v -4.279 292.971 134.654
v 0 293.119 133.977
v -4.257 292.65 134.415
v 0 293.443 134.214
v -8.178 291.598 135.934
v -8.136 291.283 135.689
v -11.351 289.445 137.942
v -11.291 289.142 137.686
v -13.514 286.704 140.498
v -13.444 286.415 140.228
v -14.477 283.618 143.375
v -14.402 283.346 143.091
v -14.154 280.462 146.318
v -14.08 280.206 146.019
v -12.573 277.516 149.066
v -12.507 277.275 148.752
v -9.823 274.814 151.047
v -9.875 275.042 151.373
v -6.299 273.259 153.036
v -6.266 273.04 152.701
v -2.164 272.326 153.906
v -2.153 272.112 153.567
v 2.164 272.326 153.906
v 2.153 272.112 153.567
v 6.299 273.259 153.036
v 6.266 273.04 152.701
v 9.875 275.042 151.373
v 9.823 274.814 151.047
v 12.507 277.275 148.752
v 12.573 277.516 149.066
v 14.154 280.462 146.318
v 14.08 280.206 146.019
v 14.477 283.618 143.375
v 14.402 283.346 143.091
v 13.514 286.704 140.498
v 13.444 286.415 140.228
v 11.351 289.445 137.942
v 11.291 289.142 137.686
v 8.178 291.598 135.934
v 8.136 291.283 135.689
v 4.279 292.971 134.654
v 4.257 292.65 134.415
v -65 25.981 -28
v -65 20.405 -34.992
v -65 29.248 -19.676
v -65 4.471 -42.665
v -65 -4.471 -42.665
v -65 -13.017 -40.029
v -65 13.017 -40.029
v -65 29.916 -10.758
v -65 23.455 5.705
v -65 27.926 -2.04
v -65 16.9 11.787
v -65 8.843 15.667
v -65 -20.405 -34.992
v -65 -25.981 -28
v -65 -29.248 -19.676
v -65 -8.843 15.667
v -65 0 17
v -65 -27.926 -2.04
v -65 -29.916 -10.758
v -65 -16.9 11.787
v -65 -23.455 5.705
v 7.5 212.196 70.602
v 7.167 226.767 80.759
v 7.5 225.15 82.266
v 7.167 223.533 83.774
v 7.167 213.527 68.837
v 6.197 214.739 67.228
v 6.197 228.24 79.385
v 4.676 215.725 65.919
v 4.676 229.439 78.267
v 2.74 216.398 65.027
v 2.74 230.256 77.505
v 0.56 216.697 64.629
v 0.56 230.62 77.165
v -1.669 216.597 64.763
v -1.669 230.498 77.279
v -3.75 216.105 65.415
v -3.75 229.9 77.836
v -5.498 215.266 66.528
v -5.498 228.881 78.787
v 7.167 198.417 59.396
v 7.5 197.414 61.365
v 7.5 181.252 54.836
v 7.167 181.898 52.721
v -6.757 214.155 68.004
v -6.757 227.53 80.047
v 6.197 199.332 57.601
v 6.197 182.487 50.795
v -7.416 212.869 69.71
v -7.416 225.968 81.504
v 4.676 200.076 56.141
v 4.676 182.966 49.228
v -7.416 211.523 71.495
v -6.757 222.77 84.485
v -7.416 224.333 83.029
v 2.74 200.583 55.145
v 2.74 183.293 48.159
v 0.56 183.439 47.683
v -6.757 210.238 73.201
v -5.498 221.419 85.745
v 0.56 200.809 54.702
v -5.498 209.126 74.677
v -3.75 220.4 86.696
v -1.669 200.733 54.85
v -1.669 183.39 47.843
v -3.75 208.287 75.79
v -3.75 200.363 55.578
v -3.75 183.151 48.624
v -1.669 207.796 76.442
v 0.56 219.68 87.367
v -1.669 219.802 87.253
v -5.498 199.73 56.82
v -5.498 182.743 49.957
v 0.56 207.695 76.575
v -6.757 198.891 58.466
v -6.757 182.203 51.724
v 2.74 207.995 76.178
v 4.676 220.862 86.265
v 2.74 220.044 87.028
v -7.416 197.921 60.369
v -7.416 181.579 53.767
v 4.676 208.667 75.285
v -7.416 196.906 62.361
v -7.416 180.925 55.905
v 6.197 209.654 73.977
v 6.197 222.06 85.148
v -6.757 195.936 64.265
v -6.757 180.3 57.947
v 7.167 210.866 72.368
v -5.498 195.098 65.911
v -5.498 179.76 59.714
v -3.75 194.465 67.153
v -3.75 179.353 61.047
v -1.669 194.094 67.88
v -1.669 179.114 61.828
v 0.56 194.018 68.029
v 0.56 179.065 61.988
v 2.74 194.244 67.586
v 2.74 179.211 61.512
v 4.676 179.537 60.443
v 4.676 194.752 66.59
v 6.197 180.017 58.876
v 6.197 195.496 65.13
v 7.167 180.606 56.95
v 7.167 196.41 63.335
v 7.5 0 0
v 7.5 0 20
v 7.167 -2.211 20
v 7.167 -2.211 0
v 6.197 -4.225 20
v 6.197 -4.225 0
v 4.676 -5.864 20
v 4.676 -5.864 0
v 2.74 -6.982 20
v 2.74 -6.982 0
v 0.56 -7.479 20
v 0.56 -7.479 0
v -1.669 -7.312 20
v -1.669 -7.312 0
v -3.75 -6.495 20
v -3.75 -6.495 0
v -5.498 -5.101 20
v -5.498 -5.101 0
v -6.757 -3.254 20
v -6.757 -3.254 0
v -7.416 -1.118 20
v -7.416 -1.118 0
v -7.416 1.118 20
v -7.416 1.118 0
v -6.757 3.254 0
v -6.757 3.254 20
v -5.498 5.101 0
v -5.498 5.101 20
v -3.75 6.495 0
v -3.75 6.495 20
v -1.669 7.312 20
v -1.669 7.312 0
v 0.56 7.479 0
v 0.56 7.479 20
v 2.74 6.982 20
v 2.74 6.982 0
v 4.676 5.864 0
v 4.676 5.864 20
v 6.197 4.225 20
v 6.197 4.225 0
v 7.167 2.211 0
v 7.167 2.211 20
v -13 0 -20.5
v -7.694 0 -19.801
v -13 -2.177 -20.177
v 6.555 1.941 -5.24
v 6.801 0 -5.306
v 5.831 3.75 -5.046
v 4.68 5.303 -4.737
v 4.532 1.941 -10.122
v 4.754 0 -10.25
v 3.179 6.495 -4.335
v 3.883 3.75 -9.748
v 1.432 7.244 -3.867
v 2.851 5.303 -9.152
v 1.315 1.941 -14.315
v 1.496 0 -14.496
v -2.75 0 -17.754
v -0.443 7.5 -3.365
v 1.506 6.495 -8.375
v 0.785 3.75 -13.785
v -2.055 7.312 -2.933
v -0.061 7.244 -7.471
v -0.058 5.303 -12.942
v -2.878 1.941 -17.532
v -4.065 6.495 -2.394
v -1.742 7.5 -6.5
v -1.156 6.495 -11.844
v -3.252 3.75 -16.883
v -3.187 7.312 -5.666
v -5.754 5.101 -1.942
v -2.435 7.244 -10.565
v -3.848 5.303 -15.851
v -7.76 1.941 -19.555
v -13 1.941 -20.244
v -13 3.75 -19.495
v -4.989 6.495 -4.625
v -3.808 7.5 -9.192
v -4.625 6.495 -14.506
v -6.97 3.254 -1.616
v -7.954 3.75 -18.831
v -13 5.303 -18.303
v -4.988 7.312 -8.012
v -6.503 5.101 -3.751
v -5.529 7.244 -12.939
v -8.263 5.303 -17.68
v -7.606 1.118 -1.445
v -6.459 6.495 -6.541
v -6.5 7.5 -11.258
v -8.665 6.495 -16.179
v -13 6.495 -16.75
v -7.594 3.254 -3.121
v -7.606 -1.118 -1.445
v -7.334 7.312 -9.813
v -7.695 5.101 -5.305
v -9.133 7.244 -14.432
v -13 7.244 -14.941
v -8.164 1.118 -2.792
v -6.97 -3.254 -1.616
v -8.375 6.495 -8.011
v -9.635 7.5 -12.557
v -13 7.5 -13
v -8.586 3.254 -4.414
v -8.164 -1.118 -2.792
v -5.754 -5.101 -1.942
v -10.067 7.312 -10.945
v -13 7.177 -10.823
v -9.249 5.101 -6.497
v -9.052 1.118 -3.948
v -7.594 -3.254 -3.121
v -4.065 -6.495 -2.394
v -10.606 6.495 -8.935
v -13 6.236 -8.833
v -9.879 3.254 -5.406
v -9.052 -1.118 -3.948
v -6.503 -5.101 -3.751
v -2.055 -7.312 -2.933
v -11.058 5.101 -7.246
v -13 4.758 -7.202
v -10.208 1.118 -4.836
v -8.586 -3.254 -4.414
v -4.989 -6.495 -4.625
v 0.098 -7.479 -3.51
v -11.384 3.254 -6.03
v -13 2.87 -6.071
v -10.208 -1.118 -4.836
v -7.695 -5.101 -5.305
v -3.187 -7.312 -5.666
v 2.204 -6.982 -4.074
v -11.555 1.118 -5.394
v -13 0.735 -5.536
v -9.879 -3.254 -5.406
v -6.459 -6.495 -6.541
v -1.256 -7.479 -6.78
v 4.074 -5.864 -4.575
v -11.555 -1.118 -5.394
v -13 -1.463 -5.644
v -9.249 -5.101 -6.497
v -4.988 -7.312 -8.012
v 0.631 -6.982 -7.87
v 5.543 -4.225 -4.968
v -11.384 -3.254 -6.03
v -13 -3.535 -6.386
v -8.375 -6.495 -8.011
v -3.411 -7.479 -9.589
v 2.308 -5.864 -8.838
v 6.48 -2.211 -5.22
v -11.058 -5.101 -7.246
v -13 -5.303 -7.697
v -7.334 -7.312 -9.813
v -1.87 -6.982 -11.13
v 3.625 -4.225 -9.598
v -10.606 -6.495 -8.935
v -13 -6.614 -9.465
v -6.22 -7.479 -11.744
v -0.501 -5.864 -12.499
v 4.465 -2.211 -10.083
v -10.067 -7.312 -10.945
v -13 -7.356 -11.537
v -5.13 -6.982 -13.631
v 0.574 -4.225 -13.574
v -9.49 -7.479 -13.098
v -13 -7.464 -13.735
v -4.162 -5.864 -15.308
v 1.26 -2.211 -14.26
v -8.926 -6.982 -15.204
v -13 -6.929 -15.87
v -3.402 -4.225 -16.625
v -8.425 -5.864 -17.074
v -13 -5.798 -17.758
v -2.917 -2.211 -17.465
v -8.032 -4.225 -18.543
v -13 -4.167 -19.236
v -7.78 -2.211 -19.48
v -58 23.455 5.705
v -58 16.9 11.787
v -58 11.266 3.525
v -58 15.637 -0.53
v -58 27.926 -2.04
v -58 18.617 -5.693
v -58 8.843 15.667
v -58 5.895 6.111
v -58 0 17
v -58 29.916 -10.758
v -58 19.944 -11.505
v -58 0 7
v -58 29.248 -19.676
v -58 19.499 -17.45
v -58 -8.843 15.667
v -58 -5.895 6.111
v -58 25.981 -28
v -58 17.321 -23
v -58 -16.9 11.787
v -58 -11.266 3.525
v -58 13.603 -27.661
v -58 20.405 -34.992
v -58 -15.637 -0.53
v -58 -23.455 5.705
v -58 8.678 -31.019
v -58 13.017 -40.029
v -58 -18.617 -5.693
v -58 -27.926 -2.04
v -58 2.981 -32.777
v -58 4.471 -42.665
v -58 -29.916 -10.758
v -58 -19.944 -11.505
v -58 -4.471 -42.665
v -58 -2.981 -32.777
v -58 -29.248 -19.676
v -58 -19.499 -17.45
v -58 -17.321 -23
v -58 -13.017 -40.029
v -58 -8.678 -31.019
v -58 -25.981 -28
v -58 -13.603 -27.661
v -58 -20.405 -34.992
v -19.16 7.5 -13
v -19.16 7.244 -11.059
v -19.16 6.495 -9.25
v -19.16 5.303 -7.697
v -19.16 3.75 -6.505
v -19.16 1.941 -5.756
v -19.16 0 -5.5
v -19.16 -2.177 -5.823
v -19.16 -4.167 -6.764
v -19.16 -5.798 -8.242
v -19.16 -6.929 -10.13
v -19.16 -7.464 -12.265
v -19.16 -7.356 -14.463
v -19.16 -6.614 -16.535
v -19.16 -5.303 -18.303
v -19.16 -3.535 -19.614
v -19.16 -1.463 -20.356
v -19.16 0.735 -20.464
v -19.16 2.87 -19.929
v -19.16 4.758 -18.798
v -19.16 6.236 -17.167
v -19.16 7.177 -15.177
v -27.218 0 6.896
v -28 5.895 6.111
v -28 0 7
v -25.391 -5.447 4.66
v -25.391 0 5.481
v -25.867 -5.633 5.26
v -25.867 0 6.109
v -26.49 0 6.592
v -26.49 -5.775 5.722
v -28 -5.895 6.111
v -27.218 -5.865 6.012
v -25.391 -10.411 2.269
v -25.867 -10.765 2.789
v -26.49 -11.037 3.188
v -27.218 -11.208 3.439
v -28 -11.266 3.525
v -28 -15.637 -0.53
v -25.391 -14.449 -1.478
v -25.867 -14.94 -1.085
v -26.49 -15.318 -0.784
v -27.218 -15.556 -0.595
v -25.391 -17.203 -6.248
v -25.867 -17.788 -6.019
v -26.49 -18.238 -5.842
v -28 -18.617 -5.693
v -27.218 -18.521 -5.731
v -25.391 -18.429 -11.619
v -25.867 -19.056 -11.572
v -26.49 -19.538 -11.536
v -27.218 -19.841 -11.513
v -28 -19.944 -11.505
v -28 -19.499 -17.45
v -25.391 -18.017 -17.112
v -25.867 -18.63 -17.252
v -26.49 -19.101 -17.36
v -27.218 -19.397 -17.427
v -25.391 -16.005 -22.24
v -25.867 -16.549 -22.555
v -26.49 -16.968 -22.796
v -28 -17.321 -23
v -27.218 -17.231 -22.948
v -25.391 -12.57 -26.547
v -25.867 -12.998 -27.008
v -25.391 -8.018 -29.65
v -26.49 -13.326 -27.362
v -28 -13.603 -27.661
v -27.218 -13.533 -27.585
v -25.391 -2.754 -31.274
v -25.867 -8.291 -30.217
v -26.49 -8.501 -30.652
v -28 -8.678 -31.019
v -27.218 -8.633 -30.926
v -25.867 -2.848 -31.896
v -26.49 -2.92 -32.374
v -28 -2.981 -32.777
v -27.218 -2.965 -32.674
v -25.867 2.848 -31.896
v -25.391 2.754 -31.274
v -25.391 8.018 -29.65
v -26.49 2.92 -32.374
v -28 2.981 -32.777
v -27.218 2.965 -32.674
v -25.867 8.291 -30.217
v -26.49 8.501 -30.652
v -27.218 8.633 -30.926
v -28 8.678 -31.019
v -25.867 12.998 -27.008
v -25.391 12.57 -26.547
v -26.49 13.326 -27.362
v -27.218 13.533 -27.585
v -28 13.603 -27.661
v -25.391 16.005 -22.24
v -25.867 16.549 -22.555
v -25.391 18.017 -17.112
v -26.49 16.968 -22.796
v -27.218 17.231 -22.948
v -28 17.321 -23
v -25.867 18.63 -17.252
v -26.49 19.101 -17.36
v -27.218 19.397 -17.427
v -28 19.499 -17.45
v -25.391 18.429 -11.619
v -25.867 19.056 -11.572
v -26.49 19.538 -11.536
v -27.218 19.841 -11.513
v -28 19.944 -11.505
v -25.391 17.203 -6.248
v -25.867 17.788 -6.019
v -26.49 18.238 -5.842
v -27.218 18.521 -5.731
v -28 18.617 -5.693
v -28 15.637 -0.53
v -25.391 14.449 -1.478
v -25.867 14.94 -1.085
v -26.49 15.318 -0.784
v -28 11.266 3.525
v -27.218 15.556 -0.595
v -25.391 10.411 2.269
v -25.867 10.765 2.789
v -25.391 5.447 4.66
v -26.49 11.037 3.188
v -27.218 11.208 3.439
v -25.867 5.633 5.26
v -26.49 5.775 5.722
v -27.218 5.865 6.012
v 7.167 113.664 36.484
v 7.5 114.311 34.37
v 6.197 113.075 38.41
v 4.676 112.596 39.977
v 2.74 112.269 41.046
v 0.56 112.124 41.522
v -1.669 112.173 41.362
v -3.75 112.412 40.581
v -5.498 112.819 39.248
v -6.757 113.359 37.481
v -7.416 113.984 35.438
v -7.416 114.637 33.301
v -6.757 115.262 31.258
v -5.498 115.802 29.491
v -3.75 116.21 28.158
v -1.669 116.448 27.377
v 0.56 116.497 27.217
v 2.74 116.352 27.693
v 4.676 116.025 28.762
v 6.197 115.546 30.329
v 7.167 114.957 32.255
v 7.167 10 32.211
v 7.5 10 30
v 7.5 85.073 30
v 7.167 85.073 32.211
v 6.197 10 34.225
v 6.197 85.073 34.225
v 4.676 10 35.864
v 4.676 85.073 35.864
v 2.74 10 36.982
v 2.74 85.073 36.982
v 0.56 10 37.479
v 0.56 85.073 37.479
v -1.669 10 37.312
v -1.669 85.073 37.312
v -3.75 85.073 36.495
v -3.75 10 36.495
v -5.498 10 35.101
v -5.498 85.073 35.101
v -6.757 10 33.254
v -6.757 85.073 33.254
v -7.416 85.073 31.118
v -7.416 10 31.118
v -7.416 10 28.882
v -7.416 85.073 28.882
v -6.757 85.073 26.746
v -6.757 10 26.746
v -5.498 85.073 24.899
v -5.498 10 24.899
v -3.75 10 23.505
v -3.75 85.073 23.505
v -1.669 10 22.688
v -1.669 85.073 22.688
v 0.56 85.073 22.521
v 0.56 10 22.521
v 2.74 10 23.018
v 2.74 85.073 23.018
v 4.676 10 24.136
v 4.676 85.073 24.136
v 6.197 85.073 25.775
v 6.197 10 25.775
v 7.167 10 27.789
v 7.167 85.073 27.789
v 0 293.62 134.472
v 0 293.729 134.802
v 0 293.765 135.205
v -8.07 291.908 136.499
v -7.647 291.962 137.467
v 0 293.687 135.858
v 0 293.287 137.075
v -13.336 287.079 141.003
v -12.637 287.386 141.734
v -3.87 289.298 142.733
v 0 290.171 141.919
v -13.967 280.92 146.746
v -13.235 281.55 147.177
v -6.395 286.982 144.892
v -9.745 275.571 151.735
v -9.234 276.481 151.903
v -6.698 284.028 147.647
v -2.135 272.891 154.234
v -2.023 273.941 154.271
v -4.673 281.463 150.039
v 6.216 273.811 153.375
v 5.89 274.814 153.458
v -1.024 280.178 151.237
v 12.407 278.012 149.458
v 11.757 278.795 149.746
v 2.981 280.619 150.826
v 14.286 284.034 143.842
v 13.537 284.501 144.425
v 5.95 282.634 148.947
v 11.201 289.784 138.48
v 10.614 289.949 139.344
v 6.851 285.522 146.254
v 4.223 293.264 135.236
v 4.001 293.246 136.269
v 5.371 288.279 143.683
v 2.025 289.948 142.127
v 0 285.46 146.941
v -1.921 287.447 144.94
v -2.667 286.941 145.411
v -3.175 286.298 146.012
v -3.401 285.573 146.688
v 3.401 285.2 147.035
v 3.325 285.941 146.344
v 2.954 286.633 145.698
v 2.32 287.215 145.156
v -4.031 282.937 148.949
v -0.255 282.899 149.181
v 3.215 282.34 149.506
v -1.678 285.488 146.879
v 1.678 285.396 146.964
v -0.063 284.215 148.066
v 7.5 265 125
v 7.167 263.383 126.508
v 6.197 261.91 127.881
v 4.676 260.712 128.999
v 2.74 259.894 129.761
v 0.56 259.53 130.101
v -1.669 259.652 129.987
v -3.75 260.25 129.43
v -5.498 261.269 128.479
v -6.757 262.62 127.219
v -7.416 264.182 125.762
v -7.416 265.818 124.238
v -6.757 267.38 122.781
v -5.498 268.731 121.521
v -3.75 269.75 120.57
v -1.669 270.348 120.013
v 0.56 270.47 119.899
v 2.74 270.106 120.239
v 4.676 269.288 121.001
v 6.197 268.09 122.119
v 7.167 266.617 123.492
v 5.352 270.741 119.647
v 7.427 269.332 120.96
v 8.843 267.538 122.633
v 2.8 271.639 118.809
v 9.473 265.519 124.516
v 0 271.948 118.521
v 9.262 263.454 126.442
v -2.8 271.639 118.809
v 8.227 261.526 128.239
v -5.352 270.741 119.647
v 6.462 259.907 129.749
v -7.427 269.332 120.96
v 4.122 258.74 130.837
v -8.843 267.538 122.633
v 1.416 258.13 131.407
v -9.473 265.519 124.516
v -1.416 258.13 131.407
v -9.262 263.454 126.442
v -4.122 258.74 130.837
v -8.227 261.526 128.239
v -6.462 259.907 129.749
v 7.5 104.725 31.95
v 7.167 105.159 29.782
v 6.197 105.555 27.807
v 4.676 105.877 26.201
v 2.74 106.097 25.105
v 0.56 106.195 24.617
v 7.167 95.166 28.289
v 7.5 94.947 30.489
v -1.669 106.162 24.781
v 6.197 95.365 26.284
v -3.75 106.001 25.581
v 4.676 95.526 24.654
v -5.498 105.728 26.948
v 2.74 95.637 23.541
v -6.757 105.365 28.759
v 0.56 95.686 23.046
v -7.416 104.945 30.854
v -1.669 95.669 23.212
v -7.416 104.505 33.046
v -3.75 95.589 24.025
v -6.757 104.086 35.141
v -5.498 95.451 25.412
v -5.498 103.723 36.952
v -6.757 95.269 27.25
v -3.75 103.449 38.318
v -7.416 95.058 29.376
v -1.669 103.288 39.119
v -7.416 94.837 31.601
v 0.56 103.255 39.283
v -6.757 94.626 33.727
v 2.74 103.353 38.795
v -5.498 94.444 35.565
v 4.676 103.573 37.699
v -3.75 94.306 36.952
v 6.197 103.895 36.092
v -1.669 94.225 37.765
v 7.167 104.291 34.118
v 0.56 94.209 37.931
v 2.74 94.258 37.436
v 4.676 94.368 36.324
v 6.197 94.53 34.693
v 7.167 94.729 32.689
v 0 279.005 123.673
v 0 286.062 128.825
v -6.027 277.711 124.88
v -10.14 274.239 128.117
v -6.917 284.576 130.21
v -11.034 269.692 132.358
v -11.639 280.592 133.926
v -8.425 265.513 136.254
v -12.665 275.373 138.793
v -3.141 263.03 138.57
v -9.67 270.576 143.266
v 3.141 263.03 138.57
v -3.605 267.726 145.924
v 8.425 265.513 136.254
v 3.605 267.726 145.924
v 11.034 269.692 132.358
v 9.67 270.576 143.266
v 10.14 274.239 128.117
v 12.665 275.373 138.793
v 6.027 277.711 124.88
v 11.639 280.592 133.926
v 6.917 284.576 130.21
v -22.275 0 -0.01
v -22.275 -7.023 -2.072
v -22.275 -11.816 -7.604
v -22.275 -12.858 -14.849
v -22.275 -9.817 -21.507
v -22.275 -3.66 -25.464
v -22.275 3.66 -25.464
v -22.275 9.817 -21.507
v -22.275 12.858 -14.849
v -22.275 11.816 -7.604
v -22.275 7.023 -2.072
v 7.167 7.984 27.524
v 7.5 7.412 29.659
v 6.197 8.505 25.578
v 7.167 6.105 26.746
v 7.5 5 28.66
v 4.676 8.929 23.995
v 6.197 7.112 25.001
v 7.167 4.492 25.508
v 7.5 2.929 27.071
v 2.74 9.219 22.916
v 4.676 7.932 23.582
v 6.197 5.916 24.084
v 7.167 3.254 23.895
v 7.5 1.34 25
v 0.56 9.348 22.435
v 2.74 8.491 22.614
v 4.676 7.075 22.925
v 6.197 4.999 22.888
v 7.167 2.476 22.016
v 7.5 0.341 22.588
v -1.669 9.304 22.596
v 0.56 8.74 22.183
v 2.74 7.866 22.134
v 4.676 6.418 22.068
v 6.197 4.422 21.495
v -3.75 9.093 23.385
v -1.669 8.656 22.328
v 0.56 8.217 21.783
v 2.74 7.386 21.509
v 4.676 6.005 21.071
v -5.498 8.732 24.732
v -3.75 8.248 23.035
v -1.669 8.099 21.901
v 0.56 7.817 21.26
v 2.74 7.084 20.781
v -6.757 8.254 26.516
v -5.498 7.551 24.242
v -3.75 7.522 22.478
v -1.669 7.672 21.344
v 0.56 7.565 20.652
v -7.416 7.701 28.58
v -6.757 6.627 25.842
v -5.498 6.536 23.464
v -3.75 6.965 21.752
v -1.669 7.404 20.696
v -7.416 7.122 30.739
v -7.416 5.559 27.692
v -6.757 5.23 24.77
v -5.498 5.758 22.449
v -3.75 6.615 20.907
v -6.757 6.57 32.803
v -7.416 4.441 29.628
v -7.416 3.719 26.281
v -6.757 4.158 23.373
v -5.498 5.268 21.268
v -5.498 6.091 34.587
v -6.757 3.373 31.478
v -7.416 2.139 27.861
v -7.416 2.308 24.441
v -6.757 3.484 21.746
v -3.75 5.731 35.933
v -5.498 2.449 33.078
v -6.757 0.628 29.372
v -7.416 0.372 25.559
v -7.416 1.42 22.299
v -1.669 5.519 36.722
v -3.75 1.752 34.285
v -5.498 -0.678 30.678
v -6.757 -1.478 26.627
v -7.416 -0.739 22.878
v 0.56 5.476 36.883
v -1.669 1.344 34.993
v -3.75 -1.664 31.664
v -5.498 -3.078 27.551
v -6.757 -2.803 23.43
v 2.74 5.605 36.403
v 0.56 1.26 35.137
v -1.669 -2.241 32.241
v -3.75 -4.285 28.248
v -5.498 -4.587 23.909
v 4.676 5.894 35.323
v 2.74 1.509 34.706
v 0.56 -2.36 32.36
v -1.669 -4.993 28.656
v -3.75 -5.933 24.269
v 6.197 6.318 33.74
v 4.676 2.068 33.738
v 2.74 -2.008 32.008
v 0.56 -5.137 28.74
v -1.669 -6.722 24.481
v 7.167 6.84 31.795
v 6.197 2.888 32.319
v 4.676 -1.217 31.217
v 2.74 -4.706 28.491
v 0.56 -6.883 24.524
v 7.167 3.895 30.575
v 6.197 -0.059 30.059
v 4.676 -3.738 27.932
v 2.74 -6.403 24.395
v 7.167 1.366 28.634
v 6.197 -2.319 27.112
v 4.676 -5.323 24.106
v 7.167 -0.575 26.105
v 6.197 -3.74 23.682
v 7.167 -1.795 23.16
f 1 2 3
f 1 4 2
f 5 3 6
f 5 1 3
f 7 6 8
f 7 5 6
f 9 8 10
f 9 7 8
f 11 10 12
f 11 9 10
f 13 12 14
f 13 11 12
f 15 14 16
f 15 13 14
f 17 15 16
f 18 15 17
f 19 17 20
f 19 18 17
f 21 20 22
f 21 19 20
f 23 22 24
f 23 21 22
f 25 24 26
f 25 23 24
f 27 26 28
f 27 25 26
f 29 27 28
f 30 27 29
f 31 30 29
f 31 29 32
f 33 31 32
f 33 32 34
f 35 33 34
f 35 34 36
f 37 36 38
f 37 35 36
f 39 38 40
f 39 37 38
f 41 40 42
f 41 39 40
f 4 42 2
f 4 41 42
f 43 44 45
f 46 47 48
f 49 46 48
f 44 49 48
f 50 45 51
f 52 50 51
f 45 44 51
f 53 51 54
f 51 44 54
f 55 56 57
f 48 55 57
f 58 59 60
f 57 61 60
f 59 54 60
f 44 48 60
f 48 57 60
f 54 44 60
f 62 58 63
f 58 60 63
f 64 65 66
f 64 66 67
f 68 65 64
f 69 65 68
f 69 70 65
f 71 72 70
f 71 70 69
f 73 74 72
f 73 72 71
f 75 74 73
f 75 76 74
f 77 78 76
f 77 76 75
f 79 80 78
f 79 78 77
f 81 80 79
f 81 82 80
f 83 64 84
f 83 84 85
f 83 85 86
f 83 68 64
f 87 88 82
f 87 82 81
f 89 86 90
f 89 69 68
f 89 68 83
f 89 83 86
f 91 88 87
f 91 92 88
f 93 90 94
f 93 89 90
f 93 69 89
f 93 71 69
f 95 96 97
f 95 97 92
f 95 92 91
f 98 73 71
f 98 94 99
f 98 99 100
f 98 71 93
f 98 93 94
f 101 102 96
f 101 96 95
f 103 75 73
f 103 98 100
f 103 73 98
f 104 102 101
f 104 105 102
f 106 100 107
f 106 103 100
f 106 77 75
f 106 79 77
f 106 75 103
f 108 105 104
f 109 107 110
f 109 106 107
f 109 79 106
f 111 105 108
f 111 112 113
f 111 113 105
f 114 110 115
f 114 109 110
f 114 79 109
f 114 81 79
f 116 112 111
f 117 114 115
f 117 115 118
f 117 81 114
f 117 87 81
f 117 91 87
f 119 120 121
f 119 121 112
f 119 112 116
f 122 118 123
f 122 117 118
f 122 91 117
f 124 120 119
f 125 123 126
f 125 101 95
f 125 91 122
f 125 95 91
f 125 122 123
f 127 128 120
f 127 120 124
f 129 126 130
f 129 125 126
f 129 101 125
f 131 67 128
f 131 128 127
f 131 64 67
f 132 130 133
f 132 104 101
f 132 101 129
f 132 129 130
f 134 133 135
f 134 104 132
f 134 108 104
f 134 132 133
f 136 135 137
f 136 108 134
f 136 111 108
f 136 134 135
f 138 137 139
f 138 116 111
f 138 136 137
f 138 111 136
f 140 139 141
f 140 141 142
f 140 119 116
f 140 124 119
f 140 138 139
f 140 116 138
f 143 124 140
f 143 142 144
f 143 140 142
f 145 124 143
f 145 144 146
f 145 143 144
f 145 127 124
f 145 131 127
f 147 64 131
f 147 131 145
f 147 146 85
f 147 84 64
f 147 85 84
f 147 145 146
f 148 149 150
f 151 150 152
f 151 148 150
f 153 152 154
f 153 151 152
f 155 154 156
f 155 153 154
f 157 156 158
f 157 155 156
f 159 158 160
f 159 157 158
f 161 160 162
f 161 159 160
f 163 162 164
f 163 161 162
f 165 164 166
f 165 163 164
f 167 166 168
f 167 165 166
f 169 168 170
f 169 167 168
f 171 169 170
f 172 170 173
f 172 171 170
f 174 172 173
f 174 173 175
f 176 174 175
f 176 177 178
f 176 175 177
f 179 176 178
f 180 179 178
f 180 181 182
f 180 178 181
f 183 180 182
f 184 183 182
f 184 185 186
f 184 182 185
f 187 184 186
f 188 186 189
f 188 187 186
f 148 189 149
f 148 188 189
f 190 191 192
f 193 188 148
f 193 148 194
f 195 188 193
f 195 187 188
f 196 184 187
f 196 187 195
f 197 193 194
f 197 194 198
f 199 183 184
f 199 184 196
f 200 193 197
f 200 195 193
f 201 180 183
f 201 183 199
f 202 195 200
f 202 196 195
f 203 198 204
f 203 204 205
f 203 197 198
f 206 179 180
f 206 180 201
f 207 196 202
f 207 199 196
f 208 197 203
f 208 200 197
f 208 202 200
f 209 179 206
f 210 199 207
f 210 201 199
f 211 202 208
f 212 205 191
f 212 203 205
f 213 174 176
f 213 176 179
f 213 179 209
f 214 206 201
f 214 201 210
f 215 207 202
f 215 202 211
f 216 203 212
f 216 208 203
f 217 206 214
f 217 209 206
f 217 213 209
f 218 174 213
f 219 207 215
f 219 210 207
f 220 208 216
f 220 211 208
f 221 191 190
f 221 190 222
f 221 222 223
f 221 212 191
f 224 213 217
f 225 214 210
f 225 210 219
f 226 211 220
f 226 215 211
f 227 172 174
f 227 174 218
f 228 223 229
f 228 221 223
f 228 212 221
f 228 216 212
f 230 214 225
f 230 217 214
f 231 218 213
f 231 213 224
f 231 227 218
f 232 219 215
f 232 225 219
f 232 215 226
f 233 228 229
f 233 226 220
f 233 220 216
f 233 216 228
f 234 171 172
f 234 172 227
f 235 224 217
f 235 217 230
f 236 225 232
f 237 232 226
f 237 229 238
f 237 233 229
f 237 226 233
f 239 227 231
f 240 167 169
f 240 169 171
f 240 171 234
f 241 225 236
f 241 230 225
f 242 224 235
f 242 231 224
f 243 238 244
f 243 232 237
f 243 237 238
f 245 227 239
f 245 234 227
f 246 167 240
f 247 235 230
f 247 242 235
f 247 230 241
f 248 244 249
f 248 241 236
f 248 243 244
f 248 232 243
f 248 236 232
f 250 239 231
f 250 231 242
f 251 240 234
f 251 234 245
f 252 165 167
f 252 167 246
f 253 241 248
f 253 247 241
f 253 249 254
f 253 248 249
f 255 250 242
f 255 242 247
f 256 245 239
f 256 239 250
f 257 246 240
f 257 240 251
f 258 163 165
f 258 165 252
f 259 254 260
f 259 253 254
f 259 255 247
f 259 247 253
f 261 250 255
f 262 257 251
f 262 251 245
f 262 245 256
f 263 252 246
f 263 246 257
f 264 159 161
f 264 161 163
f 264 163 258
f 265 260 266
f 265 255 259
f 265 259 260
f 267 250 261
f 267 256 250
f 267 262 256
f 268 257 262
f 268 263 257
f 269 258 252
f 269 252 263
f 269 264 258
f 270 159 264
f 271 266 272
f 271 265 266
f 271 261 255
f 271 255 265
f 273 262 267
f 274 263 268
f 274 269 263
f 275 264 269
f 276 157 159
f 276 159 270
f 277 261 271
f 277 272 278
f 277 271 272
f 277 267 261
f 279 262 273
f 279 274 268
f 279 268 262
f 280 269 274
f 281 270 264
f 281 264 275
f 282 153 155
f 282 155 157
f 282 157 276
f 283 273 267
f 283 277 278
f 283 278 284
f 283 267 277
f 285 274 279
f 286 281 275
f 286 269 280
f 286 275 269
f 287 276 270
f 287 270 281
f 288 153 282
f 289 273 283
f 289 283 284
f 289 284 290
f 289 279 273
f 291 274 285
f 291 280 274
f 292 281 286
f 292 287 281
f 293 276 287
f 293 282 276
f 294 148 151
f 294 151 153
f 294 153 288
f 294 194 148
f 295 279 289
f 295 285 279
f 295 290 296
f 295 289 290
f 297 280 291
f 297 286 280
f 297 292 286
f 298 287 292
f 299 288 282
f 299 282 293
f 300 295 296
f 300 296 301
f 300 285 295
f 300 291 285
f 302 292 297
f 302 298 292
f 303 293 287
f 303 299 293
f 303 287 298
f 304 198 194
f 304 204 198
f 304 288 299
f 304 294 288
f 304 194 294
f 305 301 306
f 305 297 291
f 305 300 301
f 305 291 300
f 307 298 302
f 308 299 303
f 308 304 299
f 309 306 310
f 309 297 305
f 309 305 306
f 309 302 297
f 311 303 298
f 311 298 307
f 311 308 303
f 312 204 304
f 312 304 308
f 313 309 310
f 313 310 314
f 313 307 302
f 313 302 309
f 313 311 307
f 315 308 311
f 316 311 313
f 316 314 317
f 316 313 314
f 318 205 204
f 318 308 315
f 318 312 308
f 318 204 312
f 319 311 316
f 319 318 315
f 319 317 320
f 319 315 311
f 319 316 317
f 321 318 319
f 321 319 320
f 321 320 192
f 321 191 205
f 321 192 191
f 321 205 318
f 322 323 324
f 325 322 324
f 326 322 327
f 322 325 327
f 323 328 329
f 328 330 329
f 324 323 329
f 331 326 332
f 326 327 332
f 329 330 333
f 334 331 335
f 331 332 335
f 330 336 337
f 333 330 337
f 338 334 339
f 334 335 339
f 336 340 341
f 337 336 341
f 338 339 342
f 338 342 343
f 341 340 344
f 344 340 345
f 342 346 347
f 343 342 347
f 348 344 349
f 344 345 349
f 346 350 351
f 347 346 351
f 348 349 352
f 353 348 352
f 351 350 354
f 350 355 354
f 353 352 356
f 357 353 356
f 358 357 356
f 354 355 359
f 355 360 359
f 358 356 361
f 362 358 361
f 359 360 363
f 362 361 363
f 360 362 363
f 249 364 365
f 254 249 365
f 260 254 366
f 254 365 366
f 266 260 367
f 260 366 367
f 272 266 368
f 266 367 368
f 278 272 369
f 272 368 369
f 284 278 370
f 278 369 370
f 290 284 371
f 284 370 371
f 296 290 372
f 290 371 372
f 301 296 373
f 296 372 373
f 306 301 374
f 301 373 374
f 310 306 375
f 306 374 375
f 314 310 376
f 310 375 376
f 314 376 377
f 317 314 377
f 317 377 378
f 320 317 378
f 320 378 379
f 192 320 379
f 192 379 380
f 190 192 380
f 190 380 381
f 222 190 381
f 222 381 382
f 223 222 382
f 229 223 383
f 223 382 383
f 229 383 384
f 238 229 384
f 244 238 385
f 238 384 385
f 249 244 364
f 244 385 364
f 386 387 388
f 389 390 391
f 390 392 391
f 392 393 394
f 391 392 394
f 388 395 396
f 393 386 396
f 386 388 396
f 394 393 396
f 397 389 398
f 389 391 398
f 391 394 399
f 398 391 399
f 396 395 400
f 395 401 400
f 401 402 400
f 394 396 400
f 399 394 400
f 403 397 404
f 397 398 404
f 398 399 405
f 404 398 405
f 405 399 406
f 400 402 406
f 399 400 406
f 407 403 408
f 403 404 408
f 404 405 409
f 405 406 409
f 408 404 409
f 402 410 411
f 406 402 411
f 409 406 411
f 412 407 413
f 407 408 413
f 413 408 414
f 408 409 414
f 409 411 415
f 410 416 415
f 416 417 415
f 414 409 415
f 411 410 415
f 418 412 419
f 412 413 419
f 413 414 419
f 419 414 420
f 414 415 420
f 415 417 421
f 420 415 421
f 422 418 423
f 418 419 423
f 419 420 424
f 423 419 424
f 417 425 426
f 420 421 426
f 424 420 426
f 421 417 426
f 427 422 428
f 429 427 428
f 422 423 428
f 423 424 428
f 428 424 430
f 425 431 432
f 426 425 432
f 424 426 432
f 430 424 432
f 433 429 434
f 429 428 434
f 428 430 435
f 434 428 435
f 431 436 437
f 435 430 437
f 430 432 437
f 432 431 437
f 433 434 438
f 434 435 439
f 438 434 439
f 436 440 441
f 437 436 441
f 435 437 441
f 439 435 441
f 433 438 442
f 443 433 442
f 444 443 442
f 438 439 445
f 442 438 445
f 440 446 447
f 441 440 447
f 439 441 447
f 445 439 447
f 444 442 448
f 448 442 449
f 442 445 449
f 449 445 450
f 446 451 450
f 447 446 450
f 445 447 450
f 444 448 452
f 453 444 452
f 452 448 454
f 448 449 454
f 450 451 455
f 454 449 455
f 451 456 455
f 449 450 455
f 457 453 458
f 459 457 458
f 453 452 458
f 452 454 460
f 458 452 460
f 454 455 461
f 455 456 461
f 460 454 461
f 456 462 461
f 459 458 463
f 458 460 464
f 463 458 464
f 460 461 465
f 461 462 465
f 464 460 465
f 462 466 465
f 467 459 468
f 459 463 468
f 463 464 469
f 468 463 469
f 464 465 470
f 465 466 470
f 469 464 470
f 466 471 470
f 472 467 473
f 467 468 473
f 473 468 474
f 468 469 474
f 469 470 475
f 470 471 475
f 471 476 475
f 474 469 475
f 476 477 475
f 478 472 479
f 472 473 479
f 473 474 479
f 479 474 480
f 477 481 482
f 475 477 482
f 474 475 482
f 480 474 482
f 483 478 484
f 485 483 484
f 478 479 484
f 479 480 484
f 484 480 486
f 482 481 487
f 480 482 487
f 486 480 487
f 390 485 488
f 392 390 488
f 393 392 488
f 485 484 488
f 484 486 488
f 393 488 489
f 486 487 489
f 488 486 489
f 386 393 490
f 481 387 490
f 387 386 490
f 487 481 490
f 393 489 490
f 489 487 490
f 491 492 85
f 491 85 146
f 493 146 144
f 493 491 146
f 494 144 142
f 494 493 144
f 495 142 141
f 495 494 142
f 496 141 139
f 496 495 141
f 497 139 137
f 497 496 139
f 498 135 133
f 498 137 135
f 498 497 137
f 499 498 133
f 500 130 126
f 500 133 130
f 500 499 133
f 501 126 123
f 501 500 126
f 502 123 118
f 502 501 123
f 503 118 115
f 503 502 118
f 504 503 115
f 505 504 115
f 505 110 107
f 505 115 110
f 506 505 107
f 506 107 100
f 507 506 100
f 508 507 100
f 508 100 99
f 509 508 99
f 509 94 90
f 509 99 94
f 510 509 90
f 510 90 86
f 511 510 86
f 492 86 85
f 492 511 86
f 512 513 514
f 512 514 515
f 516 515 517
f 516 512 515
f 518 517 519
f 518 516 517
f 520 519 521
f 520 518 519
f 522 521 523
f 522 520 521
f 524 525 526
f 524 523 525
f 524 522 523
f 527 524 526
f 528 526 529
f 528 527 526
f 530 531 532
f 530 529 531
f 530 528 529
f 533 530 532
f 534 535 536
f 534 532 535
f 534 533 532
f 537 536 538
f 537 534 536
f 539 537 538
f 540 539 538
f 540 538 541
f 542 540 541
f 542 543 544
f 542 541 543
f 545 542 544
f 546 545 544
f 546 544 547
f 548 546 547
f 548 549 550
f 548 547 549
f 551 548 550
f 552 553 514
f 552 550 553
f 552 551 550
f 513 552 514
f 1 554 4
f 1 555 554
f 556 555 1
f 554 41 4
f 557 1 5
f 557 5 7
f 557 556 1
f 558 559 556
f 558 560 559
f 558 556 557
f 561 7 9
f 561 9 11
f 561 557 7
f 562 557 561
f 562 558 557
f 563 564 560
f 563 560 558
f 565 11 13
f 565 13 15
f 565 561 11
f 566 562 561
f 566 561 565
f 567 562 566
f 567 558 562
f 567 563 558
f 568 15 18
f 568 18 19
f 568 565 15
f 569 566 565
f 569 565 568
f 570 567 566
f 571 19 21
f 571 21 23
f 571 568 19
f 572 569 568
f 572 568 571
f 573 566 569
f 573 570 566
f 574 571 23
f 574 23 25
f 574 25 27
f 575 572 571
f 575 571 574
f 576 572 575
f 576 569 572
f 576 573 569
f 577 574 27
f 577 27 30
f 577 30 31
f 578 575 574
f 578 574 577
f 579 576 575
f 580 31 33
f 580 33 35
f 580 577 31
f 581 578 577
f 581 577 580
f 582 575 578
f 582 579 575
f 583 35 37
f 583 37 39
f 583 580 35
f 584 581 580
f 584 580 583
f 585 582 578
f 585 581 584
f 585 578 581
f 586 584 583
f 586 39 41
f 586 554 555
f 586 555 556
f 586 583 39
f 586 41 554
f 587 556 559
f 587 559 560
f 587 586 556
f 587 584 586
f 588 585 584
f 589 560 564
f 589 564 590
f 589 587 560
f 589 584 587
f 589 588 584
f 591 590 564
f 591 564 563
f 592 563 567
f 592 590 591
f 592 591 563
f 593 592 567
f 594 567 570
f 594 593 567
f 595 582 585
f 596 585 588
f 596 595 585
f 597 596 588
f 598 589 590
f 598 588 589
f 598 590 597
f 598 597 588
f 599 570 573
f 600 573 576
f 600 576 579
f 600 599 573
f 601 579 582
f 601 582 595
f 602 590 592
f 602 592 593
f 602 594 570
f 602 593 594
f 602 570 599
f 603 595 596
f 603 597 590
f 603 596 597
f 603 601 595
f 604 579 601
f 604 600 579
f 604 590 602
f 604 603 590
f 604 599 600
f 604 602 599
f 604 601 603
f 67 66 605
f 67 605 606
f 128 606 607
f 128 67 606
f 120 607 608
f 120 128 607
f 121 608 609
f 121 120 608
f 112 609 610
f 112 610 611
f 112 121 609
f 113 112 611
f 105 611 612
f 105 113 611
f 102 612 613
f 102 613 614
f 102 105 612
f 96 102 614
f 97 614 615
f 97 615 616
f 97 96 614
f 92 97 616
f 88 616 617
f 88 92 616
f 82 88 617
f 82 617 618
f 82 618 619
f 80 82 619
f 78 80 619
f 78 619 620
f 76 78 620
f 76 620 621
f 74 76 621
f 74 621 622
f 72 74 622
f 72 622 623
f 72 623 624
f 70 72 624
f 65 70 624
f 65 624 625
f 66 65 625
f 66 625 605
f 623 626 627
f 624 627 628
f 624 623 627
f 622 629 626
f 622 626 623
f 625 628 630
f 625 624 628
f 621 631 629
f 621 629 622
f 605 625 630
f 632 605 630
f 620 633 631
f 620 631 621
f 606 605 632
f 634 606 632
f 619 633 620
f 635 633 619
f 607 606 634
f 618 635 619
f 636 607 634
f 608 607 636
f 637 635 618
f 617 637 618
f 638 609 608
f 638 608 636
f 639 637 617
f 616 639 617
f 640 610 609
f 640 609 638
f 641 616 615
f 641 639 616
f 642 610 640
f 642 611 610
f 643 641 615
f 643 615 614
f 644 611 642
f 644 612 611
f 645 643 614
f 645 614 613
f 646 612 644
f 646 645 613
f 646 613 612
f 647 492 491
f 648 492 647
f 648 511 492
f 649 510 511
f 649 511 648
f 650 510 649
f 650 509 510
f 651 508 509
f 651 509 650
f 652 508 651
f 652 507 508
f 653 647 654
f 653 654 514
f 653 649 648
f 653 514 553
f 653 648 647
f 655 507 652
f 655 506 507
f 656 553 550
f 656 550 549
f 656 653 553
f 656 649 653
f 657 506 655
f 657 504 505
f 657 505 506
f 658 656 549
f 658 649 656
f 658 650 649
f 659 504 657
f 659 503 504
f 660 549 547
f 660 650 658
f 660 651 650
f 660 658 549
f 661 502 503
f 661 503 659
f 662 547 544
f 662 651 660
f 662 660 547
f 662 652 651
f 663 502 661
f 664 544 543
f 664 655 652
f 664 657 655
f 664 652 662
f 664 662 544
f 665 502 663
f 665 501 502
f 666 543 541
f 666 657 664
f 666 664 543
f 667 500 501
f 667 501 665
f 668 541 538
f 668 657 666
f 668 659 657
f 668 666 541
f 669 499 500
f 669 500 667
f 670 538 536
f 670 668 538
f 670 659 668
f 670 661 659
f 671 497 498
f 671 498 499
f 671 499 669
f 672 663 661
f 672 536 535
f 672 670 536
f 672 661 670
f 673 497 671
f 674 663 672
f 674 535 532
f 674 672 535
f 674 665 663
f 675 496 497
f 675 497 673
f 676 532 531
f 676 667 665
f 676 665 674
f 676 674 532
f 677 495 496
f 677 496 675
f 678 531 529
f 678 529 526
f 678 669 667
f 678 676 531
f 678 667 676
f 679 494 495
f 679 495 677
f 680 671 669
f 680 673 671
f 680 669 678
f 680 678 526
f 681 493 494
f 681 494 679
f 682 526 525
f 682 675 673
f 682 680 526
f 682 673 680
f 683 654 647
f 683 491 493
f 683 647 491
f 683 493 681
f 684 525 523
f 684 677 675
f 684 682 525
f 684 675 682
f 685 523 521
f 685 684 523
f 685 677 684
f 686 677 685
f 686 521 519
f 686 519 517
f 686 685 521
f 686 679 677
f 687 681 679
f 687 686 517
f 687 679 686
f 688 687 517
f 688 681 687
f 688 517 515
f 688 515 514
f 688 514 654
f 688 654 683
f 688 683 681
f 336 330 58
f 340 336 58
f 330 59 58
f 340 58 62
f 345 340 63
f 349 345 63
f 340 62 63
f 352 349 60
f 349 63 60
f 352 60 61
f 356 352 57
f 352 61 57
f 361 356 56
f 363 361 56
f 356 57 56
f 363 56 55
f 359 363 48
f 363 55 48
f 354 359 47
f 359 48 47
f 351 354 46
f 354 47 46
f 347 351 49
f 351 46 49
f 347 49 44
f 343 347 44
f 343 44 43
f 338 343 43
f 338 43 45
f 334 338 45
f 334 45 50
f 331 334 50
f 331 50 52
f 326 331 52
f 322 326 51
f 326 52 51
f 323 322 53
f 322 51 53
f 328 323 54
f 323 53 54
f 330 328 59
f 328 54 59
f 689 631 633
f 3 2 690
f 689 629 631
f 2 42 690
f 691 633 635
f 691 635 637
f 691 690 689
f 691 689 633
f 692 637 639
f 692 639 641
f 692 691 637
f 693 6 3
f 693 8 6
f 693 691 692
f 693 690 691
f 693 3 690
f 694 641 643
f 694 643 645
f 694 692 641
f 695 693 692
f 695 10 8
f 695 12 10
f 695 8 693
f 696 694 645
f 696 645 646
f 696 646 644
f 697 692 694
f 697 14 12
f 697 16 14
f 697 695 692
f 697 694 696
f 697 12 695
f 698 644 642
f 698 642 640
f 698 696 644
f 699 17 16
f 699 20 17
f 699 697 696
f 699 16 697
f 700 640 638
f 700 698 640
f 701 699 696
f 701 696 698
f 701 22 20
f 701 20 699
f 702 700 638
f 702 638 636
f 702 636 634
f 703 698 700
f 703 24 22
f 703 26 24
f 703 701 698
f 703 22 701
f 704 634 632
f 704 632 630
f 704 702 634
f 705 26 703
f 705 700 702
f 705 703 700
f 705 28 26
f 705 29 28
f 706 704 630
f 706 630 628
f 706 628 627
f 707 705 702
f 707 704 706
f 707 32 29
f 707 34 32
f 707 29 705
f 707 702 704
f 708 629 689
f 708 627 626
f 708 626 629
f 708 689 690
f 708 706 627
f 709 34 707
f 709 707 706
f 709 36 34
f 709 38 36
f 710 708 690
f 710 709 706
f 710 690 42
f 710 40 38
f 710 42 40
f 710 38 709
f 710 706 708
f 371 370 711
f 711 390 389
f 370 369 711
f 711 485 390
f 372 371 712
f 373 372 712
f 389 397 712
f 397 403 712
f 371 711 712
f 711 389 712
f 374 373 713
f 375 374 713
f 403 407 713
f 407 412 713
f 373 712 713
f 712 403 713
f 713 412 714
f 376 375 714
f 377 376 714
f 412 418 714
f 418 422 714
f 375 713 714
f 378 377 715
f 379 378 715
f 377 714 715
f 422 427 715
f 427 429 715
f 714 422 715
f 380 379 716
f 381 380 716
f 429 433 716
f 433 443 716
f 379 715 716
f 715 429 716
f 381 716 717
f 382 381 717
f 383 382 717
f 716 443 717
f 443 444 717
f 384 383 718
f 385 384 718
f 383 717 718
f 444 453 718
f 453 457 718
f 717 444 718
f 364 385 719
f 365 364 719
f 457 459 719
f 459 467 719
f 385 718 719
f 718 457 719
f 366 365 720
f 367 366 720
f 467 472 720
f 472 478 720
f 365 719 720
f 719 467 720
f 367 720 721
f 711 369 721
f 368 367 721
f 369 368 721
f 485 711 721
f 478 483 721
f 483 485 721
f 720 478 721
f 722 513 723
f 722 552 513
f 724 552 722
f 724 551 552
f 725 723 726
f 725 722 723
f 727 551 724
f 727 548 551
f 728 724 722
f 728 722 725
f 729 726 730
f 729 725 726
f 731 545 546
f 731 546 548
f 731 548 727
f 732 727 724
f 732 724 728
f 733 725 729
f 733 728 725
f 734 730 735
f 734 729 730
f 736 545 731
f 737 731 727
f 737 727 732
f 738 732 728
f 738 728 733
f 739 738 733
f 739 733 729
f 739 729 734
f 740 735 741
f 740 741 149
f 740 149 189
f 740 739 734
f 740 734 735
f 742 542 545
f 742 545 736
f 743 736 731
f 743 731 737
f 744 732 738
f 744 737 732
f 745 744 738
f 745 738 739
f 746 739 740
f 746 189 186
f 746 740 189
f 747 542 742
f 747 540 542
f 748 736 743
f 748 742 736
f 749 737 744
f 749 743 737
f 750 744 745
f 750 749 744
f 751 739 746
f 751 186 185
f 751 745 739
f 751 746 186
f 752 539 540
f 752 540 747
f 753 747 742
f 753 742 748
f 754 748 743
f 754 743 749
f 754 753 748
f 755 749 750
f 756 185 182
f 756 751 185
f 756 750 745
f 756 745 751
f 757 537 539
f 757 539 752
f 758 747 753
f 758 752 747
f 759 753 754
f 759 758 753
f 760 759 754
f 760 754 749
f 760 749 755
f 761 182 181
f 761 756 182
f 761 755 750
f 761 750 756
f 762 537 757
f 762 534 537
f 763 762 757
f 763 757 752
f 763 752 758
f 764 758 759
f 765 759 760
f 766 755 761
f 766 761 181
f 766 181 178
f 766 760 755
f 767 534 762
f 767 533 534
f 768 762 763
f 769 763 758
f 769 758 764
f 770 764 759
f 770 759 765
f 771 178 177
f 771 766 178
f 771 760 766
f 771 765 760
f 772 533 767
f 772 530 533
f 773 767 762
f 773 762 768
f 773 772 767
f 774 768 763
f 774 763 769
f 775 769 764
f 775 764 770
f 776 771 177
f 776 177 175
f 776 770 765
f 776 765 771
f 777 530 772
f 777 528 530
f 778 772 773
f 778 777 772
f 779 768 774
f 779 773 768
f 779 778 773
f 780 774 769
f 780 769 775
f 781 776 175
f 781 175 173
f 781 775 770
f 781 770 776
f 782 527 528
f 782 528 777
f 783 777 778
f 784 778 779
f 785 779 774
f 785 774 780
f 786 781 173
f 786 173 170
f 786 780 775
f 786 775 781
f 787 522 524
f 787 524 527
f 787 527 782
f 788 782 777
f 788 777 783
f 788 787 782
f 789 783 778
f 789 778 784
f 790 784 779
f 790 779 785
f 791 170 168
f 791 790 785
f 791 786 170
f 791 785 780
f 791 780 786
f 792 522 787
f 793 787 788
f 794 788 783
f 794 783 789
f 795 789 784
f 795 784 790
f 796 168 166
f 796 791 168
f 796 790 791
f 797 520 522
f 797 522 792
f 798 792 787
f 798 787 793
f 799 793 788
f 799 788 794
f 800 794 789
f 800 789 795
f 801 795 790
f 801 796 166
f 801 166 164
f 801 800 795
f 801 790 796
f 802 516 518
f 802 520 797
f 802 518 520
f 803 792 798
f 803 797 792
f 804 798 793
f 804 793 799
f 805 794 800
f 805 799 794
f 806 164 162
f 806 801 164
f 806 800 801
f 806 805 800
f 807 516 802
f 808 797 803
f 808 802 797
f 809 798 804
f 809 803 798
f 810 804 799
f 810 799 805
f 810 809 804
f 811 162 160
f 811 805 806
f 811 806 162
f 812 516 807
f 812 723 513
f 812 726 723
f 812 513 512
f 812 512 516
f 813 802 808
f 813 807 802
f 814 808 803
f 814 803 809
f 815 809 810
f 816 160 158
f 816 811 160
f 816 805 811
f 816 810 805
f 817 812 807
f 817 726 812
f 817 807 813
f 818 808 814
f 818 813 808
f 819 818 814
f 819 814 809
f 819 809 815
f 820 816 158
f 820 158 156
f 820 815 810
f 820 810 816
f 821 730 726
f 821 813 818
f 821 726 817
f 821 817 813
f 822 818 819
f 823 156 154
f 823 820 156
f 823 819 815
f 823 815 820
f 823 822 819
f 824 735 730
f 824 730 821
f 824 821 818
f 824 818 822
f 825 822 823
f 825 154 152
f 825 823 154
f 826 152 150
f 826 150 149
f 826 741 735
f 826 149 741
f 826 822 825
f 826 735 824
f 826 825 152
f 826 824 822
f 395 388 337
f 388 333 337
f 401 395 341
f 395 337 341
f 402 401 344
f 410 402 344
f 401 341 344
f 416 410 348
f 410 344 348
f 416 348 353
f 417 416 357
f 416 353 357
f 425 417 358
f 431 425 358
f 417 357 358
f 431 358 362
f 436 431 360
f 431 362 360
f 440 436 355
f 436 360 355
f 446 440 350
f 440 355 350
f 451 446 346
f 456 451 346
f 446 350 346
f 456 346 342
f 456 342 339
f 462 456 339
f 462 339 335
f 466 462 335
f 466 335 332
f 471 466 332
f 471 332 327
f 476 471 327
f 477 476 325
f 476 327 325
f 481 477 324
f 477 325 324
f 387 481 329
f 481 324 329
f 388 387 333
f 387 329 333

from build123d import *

# Parameters (mm, degrees)
SKETCH2_R          = 7.5
SWEEP2_START       = -58
SWEEP2_OUTLINE_R   = 7.5
SWEEP2_DEPTH       = 45
SWEEP2_2_OUTLINE_R = 7.5
SWEEP2_2_ANGLE     = 90


with BuildPart() as part:
    # Sweep1: sweep along a path in Sketch1
    with BuildLine(Plane(origin=(0, 0, 0), x_dir=(0, 0, -1), z_dir=(1, 0, 0))) as sweep1_path:
        Line((-125, 265), (-82.266183324, 225.150071262))
        ThreePointArc((-82.266183324, 225.150071262), (-65.661209715, 205.006627523), (-54.835543734, 181.251871572))
        Line((-54.835543734, 181.251871572), (-34.369524404, 114.310538655))
        ThreePointArc((-34.369524404, 114.310538655), (-31.098413664, 99.854309295), (-30, 85.073368182))
        Line((-30, 85.073368182), (-30, 10))
        ThreePointArc((-30, 10), (-27.071067812, 2.928932188), (-20, 0))
        Line((-20, 0), (0, 0))
    # Sketch2 → Sweep1 (sweep)
    with BuildSketch(Plane.XY):
        Circle(SKETCH2_R)
    sweep(path=sweep1_path.line)

    # Sketch3 → Revolve1 (revolve)
    with BuildSketch(Plane(origin=(0, 0, 0), x_dir=(0, 0, -1), z_dir=(1, 0, 0))):
        with BuildLine():
            Line((-146.940611049, 285.459950802), (-125, 265))
            Line((-125, 265), (-118.521015579, 271.947860165))
            Line((-118.521015579, 271.947860165), (-133.977346338, 293.118807582))
            Line((-133.977346338, 293.118807582), (-134.213781062, 293.442658514))
            add(Edge.make_bspline(
                [(-134.213781062, 293.442658514), (-137.039454328, 296.077641462), (-146.940611049, 285.459950802)],
                knots=[3.152090242, 3.152090242, 3.152090242, 4.71238898, 4.71238898, 4.71238898], degree=2, weights=[0.958581046, 0.692308113, 1]))
        make_face()
    revolve(axis=Axis((0, 265, 125), (0, 0.6819983600624947, 0.731353701619174)))



with BuildPart() as body_2:
    # Sweep2: read off the stored shape, not the designer's step
    # Sweep2 outline → Sweep2 (new body)
    with BuildSketch(Plane.YZ.offset(SWEEP2_START)):
        with Locations((0, -13)):
            Circle(SWEEP2_OUTLINE_R)
    extrude(amount=SWEEP2_DEPTH)


with BuildPart() as part_1:
    add(part.part)

    add(body_2.part)  # Sweep2 2 merges body 2
    # Sweep2 2 outline → Sweep2 2 (revolve)
    with BuildSketch(Plane(origin=(-13, 0, 0), x_dir=(1, 0, 0), z_dir=(0, 0, 1))):
        with Locations((13, 0)):
            Circle(SWEEP2_2_OUTLINE_R)
    revolve(axis=Axis((-13, 0, 0), (0, 1, 0)), revolution_arc=SWEEP2_2_ANGLE)

    # Sketch6 → Revolve2 (revolve)
    with BuildSketch(Plane(origin=(0, 0, 0), x_dir=(1, 0, 0), z_dir=(0, 1, 0)), mode=Mode.PRIVATE) as revolve2_sk:
        with BuildLine():
            Line((-58, 33), (-58, 13))
            Line((-58, 13), (-25, 13))
            Line((-25, 13), (-25, 20.5))
            Line((-25, 20.5), (-19.159518744, 20.5))
            Line((-19.159518744, 20.5), (-25.39084721, 31.480649088))
            ThreePointArc((-25.39084721, 31.480649088), (-26.490355549, 32.592484066), (-28, 33))
            Line((-28, 33), (-58, 33))
        make_face()
        Polygon((-65, 13), (-58, 13), (-58, 33), (-58, 43), (-65, 43), align=None)
    revolve(revolve2_sk.sketch.rotate(Axis((-58, 0, -13), (1, 0, 0)), 180), axis=Axis((-58, 0, -13), (1, 0, 0)))


solid = part_1.part
